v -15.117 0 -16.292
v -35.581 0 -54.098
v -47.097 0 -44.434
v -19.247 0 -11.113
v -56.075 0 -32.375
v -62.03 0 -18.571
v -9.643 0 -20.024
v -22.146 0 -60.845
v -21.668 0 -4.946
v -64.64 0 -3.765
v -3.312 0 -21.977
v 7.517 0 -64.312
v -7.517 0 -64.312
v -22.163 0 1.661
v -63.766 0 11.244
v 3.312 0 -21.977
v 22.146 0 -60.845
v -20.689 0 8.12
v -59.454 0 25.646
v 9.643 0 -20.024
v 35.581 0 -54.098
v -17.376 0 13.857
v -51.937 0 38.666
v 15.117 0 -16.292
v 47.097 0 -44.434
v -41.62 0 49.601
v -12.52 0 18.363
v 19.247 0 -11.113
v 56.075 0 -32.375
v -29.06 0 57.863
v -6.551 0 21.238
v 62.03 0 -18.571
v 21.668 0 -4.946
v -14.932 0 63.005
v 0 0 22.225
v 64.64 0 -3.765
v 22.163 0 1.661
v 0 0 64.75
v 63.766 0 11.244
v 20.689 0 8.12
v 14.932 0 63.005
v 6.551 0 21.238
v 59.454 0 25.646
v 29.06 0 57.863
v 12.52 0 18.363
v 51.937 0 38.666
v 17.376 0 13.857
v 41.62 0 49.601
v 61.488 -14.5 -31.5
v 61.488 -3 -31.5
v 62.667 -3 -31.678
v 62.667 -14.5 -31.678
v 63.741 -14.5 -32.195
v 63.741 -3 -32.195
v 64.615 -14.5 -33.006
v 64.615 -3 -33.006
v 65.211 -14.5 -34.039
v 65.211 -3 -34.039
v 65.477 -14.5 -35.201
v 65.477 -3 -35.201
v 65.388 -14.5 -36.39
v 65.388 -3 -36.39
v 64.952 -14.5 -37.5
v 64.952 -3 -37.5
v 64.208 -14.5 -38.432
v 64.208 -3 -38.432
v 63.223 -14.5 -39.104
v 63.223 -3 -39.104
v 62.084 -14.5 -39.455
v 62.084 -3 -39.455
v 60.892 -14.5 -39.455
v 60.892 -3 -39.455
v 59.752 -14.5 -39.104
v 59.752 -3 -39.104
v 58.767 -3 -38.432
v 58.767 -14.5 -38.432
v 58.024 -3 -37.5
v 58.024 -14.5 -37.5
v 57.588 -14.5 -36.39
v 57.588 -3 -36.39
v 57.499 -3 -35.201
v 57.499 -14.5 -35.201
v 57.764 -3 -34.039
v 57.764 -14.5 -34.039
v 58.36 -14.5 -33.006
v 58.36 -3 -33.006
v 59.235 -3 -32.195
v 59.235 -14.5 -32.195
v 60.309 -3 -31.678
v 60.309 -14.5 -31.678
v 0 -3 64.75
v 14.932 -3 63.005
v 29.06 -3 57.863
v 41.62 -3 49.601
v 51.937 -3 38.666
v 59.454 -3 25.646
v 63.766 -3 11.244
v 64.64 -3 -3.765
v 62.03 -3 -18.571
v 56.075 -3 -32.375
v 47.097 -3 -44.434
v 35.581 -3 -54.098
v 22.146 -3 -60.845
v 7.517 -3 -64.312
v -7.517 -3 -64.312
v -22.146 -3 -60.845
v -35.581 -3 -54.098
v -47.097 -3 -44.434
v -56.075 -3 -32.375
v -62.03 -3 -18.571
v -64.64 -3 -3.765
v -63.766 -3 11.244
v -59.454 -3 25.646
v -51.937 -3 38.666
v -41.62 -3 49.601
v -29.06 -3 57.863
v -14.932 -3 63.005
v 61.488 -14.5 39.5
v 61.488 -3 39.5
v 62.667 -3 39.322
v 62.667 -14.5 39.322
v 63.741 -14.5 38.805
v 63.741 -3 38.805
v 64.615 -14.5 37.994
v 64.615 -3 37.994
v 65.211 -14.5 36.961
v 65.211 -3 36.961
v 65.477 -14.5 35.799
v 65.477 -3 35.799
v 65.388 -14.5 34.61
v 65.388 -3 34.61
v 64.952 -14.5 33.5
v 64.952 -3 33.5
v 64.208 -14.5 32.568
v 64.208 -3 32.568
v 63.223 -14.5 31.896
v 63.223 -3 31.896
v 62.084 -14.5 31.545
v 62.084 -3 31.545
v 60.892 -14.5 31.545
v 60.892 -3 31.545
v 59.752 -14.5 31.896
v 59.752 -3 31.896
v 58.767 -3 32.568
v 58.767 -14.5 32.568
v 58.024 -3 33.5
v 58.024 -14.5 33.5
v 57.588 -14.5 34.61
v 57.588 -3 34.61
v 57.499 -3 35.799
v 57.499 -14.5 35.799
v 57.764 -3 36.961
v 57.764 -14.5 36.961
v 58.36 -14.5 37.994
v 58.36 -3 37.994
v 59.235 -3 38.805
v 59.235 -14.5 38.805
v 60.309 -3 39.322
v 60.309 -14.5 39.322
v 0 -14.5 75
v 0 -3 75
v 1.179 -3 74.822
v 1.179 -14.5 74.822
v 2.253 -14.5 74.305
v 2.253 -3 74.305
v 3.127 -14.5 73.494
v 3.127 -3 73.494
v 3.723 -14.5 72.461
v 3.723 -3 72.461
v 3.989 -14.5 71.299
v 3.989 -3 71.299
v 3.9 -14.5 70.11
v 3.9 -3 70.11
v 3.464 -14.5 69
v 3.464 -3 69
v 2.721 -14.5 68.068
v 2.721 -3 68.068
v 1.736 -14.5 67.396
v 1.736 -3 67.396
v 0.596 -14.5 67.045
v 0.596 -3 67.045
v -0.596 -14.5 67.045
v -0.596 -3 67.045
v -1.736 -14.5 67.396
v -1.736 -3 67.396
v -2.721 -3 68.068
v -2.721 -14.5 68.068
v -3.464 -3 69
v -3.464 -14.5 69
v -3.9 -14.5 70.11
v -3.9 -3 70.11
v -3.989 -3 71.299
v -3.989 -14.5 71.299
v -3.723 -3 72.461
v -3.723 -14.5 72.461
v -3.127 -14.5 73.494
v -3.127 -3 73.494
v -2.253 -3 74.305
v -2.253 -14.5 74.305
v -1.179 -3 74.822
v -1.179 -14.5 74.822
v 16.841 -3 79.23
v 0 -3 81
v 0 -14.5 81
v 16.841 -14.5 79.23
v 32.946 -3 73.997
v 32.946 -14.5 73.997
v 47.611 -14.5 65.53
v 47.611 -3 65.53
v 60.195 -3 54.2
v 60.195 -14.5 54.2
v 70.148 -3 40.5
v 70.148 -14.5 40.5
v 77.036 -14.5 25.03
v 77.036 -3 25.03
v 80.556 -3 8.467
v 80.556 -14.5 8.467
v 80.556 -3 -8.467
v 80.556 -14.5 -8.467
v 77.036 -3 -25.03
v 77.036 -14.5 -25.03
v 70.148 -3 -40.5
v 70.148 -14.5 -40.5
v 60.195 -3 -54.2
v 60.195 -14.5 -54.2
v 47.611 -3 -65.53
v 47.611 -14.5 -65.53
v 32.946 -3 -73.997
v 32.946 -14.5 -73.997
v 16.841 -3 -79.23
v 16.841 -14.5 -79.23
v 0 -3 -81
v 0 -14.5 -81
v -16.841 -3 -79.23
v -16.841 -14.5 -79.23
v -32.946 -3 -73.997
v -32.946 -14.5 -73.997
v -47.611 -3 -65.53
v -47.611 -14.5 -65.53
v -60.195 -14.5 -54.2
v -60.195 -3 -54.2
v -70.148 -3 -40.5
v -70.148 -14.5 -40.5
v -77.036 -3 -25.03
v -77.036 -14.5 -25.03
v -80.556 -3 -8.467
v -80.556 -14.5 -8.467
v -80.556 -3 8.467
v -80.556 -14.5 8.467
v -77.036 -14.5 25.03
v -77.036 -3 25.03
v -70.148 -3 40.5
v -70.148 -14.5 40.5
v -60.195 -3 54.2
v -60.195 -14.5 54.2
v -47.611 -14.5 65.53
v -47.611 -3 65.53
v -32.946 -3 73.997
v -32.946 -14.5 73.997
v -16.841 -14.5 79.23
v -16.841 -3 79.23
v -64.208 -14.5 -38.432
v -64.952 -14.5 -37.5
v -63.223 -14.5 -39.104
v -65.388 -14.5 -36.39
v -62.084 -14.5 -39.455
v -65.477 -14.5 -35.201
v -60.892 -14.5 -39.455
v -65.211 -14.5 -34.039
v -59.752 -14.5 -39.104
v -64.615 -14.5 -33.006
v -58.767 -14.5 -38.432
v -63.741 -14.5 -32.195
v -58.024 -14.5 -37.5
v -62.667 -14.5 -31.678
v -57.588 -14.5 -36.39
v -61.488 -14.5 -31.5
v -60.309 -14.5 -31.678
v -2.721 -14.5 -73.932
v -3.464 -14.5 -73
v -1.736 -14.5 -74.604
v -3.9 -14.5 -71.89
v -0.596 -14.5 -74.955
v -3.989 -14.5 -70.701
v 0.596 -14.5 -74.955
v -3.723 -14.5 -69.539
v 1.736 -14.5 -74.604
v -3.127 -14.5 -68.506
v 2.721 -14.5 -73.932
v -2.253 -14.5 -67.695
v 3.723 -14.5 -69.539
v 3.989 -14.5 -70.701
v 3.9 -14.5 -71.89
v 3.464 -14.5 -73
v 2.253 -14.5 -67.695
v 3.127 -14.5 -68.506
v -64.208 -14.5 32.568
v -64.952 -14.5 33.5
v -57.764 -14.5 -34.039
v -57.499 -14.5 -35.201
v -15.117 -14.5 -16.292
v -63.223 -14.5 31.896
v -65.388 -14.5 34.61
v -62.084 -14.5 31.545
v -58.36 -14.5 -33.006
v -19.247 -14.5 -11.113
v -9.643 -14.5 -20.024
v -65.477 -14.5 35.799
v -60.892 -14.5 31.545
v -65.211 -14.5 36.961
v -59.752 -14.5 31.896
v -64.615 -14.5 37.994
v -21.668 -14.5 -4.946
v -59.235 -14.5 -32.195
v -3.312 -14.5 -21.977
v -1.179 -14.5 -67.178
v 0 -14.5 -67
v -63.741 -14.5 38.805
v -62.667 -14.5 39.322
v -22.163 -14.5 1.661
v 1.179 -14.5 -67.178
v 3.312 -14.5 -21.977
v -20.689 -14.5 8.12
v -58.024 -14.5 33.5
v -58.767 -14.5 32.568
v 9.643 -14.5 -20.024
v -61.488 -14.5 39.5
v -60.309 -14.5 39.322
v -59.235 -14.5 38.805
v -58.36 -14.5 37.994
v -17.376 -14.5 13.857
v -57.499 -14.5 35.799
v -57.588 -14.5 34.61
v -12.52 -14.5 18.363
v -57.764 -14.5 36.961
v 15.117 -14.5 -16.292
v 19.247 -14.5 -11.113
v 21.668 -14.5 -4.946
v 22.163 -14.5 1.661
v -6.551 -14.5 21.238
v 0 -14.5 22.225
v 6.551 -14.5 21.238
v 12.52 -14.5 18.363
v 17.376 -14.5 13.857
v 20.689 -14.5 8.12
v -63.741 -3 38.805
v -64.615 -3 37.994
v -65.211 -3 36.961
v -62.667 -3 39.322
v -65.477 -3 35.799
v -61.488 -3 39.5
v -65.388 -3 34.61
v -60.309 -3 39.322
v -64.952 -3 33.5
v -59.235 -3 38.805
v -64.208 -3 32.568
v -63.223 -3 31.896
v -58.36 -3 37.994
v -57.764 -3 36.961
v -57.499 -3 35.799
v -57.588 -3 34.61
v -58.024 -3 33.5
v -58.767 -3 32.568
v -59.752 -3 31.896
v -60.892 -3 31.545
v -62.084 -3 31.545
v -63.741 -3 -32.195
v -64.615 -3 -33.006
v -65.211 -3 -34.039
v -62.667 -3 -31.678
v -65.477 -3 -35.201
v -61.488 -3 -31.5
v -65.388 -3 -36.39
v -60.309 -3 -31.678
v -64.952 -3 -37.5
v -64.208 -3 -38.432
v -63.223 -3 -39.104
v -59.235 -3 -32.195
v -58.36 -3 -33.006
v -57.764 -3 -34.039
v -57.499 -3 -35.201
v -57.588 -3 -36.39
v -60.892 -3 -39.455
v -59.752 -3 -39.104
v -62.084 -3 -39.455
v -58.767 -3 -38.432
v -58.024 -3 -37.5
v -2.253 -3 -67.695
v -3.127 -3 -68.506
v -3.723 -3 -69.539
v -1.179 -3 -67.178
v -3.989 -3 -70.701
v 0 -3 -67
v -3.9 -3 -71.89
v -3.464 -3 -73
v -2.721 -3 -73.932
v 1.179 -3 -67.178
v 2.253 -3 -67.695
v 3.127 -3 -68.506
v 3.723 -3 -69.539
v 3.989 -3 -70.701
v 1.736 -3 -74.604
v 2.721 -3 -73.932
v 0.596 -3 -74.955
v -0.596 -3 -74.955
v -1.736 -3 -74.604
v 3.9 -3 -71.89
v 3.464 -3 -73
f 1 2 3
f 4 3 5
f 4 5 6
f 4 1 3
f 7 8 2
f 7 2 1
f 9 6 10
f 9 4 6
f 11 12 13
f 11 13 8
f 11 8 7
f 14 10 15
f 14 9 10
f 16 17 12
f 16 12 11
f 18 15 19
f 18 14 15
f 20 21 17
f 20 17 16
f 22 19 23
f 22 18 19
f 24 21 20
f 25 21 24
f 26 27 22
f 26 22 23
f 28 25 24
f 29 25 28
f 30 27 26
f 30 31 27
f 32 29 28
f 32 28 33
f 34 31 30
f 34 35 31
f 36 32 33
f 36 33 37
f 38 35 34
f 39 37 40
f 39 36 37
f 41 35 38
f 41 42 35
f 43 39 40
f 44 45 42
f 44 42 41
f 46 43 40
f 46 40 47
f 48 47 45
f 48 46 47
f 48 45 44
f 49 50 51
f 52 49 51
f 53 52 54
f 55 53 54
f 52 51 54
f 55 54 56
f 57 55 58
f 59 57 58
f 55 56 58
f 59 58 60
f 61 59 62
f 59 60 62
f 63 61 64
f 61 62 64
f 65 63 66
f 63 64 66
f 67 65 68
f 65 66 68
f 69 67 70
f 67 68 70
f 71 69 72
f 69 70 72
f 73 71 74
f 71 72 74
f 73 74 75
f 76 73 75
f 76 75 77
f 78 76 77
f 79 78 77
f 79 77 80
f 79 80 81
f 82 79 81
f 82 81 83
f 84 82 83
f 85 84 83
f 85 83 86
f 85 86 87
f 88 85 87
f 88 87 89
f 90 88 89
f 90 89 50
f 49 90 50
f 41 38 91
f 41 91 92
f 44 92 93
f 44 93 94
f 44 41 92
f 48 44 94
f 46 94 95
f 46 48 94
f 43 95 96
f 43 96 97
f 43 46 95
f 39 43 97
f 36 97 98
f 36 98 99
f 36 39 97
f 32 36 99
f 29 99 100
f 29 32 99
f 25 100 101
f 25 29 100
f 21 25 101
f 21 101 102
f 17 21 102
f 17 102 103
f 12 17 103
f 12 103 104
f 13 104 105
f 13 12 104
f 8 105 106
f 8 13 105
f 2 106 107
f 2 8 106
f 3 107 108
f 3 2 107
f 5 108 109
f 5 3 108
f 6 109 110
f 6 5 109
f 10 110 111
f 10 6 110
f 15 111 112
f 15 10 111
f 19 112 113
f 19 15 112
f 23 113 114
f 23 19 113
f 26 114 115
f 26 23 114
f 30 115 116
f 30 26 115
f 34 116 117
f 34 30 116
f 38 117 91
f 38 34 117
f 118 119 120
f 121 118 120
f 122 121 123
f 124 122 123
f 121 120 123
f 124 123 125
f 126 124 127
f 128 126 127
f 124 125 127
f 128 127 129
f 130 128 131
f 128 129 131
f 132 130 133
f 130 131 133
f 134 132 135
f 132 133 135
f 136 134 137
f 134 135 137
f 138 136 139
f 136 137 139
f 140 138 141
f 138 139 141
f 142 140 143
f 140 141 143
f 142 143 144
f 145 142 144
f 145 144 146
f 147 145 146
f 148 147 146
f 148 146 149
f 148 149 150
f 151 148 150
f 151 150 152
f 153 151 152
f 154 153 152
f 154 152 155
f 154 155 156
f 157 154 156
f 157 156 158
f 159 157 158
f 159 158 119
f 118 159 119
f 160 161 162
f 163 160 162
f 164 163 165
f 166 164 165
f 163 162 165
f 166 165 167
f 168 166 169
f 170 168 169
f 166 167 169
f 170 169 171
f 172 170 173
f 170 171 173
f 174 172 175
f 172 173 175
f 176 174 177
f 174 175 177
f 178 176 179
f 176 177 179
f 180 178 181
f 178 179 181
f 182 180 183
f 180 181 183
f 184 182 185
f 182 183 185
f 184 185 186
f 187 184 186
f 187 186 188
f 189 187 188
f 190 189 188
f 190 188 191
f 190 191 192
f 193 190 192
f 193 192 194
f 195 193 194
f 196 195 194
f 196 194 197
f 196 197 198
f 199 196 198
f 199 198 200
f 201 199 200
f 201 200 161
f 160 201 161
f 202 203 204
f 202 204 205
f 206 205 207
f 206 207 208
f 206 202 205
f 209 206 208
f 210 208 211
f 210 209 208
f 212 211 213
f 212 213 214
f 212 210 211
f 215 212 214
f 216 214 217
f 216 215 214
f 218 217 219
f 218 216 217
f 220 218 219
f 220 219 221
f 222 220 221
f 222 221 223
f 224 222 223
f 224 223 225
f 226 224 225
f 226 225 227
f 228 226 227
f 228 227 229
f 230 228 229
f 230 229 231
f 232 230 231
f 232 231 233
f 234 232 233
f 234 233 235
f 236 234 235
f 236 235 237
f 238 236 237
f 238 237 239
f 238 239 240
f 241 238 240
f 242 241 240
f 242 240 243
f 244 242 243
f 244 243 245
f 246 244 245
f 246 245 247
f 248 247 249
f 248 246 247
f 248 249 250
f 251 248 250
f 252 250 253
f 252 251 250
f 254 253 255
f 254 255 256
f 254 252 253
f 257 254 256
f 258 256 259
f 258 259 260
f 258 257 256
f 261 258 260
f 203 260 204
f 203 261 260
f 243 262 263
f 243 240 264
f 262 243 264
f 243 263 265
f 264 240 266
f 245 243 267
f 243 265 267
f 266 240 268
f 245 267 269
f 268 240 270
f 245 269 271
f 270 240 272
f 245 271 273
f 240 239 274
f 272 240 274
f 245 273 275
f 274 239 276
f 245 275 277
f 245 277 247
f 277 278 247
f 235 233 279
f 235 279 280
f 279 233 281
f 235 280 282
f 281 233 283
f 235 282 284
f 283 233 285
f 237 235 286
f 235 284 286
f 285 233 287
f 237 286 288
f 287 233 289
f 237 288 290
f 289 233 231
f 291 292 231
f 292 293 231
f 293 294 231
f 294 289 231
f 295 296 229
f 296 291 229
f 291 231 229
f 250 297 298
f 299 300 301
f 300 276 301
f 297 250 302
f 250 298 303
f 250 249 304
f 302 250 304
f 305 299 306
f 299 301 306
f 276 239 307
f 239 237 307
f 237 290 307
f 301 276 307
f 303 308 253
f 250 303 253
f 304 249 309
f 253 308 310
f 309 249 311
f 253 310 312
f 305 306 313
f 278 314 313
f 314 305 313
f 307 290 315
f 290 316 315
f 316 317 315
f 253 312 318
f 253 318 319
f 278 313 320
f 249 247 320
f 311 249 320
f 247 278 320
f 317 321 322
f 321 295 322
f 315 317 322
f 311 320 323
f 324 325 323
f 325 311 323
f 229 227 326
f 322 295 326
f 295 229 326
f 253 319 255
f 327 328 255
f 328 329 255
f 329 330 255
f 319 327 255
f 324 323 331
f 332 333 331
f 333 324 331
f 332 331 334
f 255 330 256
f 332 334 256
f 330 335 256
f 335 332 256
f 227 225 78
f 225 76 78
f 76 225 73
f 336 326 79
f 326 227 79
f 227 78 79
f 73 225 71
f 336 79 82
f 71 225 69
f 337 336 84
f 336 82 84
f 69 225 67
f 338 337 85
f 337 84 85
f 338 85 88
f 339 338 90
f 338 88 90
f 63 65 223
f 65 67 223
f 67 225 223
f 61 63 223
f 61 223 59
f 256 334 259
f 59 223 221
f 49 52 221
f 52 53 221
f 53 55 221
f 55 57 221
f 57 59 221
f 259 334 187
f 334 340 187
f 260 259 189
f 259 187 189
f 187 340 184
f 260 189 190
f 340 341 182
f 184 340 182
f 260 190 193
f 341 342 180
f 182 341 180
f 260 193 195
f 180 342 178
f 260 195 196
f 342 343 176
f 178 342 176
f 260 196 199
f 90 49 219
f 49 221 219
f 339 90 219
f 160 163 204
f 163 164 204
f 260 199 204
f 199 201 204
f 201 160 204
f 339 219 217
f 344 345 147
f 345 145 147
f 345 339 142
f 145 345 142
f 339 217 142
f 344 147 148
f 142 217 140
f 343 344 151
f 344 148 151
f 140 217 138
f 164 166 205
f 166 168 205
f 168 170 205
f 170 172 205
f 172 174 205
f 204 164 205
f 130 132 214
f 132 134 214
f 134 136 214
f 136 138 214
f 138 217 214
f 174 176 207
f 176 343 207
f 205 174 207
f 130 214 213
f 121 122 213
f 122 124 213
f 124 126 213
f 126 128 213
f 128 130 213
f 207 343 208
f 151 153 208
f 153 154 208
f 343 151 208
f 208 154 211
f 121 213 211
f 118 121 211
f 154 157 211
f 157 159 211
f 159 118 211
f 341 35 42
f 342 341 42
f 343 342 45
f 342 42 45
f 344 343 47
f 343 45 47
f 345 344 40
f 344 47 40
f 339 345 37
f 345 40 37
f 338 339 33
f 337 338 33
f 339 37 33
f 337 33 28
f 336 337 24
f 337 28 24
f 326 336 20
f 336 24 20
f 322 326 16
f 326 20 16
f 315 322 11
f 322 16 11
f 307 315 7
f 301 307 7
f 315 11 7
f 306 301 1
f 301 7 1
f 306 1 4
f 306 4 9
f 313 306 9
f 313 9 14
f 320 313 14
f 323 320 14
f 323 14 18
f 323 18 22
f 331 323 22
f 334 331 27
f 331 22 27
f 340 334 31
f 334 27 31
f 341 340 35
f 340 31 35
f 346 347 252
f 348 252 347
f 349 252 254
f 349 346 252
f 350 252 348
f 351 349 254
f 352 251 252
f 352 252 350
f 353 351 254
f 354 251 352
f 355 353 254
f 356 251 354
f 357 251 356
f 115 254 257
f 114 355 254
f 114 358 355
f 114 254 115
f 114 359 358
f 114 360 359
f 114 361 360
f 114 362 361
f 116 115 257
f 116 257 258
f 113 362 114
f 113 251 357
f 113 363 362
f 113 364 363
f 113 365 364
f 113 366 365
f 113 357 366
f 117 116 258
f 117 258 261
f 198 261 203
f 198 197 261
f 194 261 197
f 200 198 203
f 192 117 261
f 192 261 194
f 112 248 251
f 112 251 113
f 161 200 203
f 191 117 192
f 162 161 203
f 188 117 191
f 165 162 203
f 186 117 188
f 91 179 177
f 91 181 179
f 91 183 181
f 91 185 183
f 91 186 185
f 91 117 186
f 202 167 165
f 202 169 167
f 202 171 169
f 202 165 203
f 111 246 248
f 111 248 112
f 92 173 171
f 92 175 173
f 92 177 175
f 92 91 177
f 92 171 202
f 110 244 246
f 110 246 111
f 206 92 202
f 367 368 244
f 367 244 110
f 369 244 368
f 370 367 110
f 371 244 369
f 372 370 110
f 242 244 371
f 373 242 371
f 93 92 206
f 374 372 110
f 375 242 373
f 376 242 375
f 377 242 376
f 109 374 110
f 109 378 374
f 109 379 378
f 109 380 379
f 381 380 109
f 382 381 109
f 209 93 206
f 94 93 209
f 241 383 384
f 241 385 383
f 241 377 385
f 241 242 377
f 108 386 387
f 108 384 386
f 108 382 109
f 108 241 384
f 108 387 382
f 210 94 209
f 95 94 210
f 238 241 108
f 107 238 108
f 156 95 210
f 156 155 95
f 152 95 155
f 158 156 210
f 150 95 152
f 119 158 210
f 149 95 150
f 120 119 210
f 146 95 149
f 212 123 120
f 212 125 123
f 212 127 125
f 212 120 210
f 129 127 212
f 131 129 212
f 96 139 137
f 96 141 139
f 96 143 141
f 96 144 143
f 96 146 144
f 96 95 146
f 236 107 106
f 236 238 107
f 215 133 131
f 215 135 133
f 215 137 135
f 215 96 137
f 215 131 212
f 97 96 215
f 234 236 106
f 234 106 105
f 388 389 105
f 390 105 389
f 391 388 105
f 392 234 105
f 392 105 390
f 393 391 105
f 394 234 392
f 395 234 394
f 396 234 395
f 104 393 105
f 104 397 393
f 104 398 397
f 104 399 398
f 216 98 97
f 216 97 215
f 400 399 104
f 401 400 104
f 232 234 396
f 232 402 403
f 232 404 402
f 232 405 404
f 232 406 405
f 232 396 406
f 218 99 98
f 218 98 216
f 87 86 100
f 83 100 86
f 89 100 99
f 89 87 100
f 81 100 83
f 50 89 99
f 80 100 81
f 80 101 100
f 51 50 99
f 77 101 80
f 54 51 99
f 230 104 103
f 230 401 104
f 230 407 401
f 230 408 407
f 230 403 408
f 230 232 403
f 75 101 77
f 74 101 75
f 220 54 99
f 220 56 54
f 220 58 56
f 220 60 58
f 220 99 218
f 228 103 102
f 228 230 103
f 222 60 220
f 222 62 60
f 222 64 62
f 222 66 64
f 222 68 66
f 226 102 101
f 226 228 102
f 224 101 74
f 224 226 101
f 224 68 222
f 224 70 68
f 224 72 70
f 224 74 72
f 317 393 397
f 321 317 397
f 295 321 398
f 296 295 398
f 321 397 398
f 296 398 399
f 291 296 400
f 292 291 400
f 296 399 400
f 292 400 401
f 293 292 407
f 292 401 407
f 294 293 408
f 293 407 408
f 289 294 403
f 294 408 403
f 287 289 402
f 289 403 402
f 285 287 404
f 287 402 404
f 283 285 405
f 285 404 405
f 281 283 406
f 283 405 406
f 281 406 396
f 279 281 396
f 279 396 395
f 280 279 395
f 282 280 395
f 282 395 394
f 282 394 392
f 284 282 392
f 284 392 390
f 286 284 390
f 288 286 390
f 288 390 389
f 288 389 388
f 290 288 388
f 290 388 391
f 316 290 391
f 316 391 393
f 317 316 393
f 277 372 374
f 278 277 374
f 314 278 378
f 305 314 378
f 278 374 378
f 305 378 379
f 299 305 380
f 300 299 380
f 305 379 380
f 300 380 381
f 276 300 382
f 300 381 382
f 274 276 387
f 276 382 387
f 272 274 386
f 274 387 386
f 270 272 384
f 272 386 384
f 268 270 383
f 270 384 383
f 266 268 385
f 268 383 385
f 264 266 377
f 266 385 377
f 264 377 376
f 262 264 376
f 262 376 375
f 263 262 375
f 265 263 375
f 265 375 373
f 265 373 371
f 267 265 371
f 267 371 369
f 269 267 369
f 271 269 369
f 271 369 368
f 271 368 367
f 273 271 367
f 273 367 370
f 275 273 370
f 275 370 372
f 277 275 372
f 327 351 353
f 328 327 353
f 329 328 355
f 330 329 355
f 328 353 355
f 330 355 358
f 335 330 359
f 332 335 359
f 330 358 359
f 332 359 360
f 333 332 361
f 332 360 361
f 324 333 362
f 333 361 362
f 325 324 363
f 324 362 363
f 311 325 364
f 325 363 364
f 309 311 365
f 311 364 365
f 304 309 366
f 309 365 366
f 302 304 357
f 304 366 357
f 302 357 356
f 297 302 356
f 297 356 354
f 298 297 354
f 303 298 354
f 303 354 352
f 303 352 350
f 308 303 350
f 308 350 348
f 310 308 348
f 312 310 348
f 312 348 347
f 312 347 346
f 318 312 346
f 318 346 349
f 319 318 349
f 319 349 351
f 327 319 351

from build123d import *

# Parameters (mm, degrees)
SKETCH1_R           = 81
SKETCH1_R_2         = 22.225
SKETCH1_R_3         = 4
BOSS_EXTRUDE1_DEPTH = 14.5
SKETCH2_R           = 87.498812031
SKETCH2_R_2         = 64.75
CUT_EXTRUDE1_DEPTH  = 3


with BuildPart() as part:
    # Sketch1 → Boss-Extrude1 (new body)
    with BuildSketch(Plane(origin=(0, 0, 0), x_dir=(1, 0, 0), z_dir=(0, 1, 0))):
        with Locations(Location((0, 0, 0), (0, 0, 270))):
            Circle(SKETCH1_R)
        with Locations(Location((0, 0, 0), (0, 0, 270))):
            Circle(SKETCH1_R_2, mode=Mode.SUBTRACT)
        with Locations(Location((0, 71, 0), (0, 0, 270))):
            Circle(SKETCH1_R_3, mode=Mode.SUBTRACT)
        with Locations(Location((61.487803669, 35.5, 0), (0, 0, 270))):
            Circle(SKETCH1_R_3, mode=Mode.SUBTRACT)
        with Locations(Location((61.487803669, -35.5, 0), (0, 0, 270))):
            Circle(SKETCH1_R_3, mode=Mode.SUBTRACT)
        with Locations(Location((0, -71, 0), (0, 0, 270))):
            Circle(SKETCH1_R_3, mode=Mode.SUBTRACT)
        with Locations(Location((-61.487803669, -35.5, 0), (0, 0, 270))):
            Circle(SKETCH1_R_3, mode=Mode.SUBTRACT)
        with Locations(Location((-61.487803669, 35.5, 0), (0, 0, 270))):
            Circle(SKETCH1_R_3, mode=Mode.SUBTRACT)
    extrude(amount=-BOSS_EXTRUDE1_DEPTH)

    # Sketch2 → Cut-Extrude1 (cut)
    with BuildSketch(Plane(origin=(0, 0, 0), x_dir=(1, 0, 0), z_dir=(0, 1, 0))):
        Circle(SKETCH2_R)
        with Locations(Location((0, 0, 0), (0, 0, 270))):
            Circle(SKETCH2_R_2, mode=Mode.SUBTRACT)
    extrude(amount=-CUT_EXTRUDE1_DEPTH, mode=Mode.SUBTRACT)


solid = part.part
